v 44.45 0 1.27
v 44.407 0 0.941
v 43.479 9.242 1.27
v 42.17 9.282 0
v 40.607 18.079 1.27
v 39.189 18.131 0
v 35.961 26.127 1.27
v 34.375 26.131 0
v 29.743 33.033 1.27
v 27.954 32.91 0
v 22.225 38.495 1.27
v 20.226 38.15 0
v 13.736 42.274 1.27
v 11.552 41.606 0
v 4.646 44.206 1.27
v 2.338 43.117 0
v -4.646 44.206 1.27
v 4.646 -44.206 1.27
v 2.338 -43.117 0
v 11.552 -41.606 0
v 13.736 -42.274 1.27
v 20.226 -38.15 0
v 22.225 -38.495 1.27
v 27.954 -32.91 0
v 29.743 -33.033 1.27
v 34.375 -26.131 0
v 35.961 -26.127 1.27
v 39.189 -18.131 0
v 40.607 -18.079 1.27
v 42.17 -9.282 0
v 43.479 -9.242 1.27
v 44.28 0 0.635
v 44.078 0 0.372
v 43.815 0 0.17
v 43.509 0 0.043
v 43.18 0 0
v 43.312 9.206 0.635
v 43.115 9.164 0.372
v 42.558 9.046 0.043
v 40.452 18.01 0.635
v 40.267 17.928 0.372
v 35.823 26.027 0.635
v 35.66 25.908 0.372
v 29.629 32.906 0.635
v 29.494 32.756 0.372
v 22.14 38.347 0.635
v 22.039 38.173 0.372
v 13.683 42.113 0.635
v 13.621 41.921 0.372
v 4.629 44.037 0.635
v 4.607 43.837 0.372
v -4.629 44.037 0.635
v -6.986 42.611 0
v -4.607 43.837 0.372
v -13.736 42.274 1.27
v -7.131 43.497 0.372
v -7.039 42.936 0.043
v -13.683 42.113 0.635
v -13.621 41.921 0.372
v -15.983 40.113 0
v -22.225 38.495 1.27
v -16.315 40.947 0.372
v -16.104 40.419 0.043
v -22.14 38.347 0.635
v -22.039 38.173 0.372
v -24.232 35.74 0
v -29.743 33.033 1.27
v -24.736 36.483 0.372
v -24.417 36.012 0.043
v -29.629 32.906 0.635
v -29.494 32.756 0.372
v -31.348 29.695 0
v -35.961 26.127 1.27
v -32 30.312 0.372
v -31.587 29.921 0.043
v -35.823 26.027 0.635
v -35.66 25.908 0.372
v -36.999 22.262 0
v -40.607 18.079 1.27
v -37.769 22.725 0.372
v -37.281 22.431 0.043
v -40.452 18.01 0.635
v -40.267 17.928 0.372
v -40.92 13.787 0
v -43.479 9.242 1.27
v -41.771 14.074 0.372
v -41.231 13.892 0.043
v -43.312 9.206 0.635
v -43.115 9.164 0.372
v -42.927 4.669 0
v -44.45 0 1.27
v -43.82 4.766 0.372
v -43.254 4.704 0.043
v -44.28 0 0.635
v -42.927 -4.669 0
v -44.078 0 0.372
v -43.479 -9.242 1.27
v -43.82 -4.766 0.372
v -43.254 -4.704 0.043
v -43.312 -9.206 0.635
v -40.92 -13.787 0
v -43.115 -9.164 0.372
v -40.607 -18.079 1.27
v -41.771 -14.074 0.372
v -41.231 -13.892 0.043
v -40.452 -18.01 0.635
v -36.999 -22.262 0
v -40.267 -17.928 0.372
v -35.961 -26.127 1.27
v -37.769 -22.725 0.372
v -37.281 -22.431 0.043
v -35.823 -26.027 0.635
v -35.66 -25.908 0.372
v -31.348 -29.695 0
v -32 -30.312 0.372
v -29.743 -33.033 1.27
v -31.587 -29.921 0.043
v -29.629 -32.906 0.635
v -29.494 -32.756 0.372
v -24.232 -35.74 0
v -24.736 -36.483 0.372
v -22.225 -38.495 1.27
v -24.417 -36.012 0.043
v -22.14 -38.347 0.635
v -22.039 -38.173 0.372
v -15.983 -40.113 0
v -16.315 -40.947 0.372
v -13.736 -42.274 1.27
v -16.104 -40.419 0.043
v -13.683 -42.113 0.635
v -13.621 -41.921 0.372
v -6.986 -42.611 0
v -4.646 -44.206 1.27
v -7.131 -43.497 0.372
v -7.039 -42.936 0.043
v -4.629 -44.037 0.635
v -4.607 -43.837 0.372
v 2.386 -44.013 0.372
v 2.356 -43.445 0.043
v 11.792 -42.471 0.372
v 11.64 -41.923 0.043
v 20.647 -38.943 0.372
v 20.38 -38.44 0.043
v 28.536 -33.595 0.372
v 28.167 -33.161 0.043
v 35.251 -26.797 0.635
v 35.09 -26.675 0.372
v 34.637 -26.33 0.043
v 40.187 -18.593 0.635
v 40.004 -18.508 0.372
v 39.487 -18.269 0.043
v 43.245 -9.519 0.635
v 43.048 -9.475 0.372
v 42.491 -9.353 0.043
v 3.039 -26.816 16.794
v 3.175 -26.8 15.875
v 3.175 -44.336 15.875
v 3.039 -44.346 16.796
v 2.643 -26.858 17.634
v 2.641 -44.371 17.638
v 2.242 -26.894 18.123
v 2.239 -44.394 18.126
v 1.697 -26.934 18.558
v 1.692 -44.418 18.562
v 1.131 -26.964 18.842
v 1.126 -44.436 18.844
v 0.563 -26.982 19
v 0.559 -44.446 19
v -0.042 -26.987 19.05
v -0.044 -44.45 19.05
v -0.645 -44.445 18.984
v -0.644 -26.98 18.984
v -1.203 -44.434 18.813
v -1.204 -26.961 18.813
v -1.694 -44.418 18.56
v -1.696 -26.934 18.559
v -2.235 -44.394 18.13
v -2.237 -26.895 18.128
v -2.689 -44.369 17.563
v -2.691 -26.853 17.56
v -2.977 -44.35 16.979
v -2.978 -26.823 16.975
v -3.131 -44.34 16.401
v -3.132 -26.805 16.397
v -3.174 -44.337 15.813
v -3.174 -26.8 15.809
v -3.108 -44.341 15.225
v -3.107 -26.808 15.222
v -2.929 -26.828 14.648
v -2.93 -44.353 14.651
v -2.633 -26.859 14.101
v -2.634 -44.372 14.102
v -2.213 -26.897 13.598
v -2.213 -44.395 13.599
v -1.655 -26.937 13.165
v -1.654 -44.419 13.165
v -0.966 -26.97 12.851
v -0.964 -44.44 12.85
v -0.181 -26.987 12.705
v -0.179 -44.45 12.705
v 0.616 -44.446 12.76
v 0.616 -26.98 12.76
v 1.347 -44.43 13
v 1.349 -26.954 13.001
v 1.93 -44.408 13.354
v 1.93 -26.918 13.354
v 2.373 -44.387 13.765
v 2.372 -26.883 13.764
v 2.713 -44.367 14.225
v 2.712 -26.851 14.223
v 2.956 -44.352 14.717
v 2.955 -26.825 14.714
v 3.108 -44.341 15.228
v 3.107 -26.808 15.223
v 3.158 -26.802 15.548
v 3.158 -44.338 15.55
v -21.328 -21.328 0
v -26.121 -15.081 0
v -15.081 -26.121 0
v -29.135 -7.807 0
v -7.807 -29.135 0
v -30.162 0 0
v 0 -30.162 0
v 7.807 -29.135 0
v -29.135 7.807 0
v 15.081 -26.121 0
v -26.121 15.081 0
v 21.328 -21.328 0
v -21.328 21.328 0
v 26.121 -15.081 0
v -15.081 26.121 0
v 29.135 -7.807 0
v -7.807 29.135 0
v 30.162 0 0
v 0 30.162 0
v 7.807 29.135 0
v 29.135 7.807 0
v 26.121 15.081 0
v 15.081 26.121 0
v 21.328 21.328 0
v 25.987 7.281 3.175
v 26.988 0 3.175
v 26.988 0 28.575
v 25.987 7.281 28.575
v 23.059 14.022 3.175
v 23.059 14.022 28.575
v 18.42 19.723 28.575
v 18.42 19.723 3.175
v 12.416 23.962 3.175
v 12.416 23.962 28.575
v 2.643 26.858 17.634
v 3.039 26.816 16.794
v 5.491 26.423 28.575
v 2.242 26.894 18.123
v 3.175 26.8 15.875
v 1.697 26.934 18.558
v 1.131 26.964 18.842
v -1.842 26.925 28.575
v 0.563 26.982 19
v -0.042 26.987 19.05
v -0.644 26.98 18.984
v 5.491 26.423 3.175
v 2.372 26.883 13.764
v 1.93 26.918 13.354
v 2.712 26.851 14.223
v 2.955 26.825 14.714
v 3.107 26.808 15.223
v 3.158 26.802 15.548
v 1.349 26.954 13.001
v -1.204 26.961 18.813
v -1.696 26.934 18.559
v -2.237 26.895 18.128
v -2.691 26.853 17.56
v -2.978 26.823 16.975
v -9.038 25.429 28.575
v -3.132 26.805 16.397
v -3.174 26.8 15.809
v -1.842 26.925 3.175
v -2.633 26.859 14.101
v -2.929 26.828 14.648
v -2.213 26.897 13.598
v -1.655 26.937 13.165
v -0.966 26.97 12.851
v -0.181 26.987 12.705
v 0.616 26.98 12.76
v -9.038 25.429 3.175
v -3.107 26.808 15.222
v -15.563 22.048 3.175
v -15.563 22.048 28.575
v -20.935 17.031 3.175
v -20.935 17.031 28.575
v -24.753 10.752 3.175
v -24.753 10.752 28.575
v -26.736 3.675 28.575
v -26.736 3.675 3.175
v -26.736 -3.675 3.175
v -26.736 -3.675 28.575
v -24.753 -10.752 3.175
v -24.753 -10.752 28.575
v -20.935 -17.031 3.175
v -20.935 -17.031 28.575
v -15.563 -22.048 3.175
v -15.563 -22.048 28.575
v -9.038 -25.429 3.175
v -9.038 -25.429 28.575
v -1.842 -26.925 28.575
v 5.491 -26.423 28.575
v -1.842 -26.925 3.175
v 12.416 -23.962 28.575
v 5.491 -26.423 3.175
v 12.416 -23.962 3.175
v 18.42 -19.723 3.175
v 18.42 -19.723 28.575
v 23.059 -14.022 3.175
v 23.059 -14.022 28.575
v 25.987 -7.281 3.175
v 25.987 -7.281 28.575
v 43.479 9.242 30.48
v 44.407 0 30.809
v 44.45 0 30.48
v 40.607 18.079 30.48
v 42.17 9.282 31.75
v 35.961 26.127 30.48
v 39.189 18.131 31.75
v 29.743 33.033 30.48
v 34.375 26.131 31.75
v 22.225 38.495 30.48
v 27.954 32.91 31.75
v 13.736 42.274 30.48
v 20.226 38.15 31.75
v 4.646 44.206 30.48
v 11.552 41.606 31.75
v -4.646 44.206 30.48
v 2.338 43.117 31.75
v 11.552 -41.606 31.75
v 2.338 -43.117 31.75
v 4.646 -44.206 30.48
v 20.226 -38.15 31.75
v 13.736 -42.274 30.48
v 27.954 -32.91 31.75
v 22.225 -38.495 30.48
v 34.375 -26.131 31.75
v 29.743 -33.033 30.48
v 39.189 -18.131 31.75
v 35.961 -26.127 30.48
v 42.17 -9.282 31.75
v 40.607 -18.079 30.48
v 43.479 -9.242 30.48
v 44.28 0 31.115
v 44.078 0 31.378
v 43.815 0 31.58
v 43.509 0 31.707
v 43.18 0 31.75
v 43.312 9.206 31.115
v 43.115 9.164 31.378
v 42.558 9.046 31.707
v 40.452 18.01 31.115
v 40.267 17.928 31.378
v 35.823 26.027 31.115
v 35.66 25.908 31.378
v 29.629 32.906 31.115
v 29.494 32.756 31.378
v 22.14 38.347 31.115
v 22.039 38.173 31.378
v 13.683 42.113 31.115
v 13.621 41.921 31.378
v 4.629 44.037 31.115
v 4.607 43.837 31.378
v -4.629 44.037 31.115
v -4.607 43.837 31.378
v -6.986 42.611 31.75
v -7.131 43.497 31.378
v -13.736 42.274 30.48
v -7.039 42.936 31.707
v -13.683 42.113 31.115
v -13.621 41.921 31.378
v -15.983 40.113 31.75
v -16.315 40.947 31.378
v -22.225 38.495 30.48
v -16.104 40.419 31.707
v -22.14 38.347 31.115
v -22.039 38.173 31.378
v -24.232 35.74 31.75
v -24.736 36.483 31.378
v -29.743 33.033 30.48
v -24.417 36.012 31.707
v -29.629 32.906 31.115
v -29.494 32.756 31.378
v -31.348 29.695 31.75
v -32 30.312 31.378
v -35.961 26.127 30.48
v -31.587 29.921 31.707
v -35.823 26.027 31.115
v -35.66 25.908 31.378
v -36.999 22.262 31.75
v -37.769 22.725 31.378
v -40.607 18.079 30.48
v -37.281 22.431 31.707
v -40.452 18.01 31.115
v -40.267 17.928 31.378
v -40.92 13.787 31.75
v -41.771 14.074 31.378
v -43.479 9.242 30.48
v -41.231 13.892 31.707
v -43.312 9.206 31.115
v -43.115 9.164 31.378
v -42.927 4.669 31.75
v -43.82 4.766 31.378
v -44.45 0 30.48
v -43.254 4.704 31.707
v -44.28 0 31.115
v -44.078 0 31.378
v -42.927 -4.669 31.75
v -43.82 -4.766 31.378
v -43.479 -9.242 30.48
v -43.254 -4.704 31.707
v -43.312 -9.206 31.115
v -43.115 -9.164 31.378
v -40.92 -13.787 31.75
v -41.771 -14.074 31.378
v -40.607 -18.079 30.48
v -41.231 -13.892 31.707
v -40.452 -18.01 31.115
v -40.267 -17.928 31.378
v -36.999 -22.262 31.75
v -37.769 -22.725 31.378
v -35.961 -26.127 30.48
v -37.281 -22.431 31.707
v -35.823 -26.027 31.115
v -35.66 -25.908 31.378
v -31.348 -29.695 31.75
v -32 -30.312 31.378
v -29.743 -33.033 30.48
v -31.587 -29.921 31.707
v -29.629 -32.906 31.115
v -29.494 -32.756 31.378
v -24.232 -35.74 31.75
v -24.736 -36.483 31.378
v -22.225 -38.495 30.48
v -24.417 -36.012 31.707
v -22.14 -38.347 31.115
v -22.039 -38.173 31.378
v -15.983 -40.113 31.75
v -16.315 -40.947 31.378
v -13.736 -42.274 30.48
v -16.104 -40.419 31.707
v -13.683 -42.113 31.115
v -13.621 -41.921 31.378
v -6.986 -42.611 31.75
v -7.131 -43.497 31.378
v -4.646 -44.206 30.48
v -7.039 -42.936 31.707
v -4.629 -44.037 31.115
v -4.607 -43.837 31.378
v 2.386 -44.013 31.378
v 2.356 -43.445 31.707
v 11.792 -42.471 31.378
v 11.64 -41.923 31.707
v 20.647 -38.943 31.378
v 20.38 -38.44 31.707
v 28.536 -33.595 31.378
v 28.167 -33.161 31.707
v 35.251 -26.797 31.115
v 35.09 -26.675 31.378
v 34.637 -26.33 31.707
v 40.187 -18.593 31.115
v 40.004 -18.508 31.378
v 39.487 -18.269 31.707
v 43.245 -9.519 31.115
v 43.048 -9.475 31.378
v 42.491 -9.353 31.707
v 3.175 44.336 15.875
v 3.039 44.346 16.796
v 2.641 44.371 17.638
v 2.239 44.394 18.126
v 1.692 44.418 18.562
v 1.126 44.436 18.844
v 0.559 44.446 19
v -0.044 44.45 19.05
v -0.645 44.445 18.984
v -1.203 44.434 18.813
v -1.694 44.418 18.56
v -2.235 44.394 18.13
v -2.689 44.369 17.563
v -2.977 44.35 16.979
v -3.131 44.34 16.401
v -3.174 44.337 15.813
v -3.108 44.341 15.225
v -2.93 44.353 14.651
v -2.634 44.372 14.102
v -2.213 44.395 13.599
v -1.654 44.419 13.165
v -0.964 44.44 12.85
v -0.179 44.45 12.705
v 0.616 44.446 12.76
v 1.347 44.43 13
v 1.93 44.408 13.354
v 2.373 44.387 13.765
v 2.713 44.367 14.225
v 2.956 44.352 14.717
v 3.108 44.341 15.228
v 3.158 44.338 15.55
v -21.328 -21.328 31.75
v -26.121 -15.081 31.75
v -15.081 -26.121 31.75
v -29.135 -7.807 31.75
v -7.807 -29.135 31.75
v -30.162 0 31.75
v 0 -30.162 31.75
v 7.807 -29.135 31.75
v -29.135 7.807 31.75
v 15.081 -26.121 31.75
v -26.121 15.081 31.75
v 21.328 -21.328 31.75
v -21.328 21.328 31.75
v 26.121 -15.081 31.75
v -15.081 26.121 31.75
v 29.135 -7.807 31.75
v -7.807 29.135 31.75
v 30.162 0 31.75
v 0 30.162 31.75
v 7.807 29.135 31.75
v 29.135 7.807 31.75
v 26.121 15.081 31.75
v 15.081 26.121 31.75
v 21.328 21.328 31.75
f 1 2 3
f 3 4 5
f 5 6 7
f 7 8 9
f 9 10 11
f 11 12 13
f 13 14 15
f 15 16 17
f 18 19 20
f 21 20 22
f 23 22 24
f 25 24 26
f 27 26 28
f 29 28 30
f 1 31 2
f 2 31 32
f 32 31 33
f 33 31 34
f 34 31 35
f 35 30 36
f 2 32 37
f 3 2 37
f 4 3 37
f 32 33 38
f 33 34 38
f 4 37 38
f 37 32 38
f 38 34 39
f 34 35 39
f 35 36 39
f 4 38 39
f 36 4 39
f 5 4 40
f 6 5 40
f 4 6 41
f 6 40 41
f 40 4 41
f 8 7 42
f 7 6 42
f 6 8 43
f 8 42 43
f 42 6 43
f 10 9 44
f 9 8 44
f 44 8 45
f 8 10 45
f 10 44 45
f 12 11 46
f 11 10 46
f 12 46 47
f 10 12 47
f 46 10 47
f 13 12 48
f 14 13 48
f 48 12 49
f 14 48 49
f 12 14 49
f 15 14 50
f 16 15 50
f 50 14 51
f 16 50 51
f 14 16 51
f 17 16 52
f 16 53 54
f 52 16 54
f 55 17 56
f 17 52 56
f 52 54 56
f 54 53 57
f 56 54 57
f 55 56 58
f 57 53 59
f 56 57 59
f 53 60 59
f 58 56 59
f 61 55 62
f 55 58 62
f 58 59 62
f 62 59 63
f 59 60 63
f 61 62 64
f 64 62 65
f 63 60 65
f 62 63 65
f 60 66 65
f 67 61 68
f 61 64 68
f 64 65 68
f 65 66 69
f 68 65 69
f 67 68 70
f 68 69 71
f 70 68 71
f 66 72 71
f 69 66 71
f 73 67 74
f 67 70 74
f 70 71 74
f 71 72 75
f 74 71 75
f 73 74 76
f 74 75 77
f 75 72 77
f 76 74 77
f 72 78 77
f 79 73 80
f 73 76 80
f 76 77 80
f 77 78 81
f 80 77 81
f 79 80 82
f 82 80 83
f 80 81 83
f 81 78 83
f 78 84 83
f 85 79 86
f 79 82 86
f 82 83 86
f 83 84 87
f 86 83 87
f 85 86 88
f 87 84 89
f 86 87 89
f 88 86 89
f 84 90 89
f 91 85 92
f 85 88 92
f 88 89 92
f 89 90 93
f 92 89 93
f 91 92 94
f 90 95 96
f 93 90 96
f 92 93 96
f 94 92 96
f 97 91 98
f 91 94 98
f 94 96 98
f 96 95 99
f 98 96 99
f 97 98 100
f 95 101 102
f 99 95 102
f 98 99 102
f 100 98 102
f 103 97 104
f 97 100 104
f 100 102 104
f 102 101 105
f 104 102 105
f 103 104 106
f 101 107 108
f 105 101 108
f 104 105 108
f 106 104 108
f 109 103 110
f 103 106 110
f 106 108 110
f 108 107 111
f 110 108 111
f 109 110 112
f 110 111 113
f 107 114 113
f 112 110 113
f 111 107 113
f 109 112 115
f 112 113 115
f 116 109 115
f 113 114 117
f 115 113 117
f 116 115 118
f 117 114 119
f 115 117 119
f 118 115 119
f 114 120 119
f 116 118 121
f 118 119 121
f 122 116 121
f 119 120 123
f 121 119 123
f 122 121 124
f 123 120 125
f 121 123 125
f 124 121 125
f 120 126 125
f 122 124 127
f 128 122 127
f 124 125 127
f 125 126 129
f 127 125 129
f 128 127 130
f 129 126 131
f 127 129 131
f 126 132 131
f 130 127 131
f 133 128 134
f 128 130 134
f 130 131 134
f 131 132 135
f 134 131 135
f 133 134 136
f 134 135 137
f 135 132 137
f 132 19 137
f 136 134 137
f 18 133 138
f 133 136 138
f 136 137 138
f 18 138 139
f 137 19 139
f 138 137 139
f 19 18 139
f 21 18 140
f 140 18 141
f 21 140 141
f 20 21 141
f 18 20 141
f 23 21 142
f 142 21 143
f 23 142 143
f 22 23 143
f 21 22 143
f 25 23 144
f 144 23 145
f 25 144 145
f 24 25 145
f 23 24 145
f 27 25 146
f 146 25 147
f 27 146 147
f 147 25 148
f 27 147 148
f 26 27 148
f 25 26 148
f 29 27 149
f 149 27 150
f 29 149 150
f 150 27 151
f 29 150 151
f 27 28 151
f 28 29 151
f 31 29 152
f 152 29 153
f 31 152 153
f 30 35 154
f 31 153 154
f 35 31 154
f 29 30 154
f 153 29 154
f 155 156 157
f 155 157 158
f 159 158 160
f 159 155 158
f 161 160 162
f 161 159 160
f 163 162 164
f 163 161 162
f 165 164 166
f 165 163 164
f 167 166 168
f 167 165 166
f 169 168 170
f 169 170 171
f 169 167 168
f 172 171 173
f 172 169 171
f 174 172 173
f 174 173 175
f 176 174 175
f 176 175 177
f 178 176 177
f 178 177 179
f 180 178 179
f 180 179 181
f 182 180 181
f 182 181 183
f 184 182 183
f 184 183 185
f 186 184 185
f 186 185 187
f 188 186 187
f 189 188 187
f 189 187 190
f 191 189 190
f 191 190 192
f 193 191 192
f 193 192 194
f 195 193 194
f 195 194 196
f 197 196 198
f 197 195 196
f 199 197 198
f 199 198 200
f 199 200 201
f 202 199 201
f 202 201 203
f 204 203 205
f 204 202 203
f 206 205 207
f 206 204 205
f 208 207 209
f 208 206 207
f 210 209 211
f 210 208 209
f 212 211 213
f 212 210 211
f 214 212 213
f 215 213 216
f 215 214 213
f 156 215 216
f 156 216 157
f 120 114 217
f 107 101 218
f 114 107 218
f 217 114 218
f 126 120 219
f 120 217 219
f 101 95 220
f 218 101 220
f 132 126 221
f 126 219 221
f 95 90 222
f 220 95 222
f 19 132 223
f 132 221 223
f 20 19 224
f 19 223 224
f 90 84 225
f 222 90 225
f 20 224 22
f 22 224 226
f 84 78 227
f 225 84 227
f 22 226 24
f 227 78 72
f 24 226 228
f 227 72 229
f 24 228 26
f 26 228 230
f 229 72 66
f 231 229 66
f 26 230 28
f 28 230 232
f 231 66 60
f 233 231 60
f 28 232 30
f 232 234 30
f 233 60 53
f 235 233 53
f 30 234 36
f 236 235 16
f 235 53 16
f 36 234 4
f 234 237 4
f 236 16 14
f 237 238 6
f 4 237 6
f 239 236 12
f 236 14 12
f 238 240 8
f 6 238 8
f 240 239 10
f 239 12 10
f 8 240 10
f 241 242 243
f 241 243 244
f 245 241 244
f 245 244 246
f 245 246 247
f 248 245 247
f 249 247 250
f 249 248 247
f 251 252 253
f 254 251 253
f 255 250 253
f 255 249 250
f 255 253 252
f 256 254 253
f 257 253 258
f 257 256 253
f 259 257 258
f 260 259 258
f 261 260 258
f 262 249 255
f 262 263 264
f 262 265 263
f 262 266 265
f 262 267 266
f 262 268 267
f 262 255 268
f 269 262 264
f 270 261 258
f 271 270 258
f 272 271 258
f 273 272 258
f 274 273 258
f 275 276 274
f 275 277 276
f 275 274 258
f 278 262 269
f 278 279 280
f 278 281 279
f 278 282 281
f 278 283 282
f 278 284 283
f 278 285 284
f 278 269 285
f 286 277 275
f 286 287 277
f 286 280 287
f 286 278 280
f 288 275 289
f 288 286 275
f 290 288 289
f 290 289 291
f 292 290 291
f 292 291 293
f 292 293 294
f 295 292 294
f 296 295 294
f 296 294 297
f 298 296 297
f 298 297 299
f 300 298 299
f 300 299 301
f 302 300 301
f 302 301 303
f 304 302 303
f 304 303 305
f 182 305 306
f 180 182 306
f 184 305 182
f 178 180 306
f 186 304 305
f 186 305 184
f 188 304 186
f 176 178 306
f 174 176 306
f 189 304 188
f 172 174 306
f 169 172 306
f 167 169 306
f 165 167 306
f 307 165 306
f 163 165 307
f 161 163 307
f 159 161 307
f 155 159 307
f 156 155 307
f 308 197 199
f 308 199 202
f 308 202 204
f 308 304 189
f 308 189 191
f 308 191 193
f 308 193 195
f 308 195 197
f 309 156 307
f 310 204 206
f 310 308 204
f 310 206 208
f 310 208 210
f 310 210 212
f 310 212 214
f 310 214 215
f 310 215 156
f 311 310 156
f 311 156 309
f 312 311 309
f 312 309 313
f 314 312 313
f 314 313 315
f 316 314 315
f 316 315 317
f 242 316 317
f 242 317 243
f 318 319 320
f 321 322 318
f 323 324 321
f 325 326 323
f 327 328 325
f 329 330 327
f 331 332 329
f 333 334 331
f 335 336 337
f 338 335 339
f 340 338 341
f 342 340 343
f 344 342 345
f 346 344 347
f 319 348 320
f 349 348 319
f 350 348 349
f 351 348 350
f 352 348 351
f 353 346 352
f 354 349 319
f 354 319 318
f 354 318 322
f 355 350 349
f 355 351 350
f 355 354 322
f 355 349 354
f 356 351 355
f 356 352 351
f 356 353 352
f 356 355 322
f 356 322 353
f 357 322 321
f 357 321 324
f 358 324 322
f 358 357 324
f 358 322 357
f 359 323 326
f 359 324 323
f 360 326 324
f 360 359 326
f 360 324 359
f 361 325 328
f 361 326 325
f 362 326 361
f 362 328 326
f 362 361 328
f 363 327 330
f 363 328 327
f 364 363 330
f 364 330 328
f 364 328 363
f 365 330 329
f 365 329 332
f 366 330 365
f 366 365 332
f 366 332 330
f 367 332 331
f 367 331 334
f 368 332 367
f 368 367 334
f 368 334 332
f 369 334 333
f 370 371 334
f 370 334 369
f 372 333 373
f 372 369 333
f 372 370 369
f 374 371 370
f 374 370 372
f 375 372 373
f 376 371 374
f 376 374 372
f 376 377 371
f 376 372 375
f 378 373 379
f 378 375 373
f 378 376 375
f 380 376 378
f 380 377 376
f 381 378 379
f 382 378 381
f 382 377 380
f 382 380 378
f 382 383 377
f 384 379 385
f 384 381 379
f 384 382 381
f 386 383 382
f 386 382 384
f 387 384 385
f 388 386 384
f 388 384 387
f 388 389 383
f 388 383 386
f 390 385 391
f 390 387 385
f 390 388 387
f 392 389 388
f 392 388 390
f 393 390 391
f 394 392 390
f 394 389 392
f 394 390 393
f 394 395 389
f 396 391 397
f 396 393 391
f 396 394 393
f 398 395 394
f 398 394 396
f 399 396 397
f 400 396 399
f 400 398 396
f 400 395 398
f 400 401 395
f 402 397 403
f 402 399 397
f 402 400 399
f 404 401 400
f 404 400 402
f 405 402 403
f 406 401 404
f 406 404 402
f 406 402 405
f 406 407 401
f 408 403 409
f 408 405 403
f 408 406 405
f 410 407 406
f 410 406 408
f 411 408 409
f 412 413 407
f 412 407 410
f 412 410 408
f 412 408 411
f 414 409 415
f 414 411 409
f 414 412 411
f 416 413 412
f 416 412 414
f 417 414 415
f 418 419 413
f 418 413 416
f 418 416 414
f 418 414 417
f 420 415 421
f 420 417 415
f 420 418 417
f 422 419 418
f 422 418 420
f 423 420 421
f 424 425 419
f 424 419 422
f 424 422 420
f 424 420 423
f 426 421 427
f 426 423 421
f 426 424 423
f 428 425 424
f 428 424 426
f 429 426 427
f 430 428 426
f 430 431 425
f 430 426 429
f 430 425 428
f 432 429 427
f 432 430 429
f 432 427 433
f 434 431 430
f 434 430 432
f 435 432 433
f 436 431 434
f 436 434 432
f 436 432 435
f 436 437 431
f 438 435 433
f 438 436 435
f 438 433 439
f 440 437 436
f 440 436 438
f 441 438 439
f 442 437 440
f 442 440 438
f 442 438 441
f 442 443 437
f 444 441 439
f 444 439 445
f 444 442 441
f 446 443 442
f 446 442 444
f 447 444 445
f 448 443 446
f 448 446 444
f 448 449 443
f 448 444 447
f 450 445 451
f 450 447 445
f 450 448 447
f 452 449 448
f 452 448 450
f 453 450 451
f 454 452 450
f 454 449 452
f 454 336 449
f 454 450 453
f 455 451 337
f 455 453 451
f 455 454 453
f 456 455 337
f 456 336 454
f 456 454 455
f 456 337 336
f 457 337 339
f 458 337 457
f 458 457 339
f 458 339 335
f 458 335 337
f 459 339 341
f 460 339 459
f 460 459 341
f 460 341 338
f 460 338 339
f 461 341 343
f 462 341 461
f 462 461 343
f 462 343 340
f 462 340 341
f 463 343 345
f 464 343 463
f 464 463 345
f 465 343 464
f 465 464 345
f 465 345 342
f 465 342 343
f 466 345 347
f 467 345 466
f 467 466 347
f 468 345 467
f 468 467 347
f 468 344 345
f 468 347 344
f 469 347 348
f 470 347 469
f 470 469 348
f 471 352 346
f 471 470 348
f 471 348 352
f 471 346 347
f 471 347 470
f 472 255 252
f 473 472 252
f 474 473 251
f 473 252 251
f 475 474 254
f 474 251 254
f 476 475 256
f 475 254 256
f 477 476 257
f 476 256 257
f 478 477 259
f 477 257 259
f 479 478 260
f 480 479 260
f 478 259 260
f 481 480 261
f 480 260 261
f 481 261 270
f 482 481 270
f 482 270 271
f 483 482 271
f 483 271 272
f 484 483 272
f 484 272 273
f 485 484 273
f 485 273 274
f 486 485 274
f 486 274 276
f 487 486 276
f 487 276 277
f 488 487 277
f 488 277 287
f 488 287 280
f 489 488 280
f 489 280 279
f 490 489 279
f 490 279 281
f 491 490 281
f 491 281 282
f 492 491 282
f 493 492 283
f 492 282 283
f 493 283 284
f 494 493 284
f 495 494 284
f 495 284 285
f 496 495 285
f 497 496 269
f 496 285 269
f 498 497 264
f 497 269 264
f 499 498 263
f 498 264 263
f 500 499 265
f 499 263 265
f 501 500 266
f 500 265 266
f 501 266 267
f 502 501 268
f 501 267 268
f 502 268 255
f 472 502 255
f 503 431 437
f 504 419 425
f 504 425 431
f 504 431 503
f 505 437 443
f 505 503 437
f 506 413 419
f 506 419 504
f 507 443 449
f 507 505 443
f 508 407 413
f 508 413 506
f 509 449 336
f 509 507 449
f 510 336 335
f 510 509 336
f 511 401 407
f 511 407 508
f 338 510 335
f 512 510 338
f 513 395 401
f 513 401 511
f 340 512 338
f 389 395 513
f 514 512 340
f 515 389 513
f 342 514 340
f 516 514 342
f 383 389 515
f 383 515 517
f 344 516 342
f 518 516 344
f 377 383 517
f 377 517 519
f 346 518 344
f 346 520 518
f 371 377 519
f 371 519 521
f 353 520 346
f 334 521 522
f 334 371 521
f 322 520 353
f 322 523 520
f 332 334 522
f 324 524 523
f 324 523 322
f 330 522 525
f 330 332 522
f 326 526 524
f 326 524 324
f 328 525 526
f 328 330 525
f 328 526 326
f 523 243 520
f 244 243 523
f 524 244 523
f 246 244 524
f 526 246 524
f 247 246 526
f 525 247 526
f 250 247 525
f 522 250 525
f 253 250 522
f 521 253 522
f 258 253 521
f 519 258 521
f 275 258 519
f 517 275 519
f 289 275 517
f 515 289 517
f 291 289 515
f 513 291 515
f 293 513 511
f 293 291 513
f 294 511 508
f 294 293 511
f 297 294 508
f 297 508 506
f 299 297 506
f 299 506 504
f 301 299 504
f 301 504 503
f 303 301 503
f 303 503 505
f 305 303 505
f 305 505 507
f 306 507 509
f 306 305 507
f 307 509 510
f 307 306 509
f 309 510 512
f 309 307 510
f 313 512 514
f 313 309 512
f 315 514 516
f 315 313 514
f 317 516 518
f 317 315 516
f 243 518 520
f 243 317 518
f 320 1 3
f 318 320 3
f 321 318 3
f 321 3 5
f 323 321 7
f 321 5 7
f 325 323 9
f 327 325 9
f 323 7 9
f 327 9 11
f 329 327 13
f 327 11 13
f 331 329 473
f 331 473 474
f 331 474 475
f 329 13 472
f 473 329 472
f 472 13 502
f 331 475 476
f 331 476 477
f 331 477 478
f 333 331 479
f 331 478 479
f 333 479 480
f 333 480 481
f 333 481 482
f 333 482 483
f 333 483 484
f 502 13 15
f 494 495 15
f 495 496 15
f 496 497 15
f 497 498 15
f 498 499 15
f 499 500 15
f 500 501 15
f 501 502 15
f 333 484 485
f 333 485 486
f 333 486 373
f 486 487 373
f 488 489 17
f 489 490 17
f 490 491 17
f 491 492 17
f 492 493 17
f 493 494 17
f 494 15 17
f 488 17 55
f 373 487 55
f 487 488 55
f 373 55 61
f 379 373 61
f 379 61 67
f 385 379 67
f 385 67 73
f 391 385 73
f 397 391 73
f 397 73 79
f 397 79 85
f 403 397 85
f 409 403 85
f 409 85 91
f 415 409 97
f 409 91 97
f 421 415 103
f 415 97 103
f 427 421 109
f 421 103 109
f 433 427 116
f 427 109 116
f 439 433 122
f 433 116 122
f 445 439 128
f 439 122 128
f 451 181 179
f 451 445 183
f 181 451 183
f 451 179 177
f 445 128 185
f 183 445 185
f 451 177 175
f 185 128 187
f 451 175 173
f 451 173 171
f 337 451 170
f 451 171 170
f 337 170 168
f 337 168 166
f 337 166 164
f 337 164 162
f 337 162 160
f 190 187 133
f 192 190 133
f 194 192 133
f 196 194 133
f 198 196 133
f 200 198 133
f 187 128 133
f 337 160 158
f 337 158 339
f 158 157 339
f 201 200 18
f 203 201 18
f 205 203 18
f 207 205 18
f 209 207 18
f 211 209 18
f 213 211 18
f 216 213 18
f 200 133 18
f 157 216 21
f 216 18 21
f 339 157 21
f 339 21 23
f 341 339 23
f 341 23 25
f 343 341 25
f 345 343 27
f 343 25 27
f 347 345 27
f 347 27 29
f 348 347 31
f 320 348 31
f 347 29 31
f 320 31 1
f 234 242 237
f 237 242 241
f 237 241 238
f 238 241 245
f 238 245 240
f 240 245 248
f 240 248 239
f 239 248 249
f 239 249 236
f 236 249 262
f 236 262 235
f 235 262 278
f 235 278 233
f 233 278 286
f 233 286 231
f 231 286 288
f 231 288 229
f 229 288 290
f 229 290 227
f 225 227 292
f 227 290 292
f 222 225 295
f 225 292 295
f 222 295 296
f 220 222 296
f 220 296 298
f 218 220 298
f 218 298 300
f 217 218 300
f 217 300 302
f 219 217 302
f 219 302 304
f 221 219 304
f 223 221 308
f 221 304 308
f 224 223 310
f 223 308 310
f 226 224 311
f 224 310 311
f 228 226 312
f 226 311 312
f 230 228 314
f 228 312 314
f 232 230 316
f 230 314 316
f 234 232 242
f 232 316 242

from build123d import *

# Parameters (mm, degrees)
F0_R          = 44.45
F0_R_2        = 26.9875
F1_DEPTH      = 31.75
F2_R          = 3.175
F3_DEPTH      = 44.451
F3_DEPTH_BACK = 44.451
F4_R          = 1.27
F5_SIZE       = 3.175


with BuildPart() as f1:
    # F0 (on Top) → F1 (new body)
    with BuildSketch(Plane.XY):
        Circle(F0_R)
        Circle(F0_R_2, mode=Mode.SUBTRACT)
    extrude(amount=F1_DEPTH)

    # F2 (on Front) → F3 (cut, two sides)
    with BuildSketch(Plane.XZ) as f3_sk:
        with Locations((0, 15.875)):
            Circle(F2_R)
    extrude(amount=-F3_DEPTH, mode=Mode.SUBTRACT)
    extrude(f3_sk.sketch, amount=F3_DEPTH_BACK, mode=Mode.SUBTRACT)

    # F4
    f4_edges = [f1.edges().sort_by_distance(p)[0] for p in [
        (-44.45, 0, 31.75),
        (-44.45, 0, 0),
    ]]
    fillet(f4_edges, radius=F4_R)

    # F5
    f5_edges = [f1.edges().sort_by_distance(p)[0] for p in [
        (-26.9875, 0, 31.75),
        (-26.9875, 0, 0),
    ]]
    chamfer(f5_edges, length=F5_SIZE)


solid = f1.part
